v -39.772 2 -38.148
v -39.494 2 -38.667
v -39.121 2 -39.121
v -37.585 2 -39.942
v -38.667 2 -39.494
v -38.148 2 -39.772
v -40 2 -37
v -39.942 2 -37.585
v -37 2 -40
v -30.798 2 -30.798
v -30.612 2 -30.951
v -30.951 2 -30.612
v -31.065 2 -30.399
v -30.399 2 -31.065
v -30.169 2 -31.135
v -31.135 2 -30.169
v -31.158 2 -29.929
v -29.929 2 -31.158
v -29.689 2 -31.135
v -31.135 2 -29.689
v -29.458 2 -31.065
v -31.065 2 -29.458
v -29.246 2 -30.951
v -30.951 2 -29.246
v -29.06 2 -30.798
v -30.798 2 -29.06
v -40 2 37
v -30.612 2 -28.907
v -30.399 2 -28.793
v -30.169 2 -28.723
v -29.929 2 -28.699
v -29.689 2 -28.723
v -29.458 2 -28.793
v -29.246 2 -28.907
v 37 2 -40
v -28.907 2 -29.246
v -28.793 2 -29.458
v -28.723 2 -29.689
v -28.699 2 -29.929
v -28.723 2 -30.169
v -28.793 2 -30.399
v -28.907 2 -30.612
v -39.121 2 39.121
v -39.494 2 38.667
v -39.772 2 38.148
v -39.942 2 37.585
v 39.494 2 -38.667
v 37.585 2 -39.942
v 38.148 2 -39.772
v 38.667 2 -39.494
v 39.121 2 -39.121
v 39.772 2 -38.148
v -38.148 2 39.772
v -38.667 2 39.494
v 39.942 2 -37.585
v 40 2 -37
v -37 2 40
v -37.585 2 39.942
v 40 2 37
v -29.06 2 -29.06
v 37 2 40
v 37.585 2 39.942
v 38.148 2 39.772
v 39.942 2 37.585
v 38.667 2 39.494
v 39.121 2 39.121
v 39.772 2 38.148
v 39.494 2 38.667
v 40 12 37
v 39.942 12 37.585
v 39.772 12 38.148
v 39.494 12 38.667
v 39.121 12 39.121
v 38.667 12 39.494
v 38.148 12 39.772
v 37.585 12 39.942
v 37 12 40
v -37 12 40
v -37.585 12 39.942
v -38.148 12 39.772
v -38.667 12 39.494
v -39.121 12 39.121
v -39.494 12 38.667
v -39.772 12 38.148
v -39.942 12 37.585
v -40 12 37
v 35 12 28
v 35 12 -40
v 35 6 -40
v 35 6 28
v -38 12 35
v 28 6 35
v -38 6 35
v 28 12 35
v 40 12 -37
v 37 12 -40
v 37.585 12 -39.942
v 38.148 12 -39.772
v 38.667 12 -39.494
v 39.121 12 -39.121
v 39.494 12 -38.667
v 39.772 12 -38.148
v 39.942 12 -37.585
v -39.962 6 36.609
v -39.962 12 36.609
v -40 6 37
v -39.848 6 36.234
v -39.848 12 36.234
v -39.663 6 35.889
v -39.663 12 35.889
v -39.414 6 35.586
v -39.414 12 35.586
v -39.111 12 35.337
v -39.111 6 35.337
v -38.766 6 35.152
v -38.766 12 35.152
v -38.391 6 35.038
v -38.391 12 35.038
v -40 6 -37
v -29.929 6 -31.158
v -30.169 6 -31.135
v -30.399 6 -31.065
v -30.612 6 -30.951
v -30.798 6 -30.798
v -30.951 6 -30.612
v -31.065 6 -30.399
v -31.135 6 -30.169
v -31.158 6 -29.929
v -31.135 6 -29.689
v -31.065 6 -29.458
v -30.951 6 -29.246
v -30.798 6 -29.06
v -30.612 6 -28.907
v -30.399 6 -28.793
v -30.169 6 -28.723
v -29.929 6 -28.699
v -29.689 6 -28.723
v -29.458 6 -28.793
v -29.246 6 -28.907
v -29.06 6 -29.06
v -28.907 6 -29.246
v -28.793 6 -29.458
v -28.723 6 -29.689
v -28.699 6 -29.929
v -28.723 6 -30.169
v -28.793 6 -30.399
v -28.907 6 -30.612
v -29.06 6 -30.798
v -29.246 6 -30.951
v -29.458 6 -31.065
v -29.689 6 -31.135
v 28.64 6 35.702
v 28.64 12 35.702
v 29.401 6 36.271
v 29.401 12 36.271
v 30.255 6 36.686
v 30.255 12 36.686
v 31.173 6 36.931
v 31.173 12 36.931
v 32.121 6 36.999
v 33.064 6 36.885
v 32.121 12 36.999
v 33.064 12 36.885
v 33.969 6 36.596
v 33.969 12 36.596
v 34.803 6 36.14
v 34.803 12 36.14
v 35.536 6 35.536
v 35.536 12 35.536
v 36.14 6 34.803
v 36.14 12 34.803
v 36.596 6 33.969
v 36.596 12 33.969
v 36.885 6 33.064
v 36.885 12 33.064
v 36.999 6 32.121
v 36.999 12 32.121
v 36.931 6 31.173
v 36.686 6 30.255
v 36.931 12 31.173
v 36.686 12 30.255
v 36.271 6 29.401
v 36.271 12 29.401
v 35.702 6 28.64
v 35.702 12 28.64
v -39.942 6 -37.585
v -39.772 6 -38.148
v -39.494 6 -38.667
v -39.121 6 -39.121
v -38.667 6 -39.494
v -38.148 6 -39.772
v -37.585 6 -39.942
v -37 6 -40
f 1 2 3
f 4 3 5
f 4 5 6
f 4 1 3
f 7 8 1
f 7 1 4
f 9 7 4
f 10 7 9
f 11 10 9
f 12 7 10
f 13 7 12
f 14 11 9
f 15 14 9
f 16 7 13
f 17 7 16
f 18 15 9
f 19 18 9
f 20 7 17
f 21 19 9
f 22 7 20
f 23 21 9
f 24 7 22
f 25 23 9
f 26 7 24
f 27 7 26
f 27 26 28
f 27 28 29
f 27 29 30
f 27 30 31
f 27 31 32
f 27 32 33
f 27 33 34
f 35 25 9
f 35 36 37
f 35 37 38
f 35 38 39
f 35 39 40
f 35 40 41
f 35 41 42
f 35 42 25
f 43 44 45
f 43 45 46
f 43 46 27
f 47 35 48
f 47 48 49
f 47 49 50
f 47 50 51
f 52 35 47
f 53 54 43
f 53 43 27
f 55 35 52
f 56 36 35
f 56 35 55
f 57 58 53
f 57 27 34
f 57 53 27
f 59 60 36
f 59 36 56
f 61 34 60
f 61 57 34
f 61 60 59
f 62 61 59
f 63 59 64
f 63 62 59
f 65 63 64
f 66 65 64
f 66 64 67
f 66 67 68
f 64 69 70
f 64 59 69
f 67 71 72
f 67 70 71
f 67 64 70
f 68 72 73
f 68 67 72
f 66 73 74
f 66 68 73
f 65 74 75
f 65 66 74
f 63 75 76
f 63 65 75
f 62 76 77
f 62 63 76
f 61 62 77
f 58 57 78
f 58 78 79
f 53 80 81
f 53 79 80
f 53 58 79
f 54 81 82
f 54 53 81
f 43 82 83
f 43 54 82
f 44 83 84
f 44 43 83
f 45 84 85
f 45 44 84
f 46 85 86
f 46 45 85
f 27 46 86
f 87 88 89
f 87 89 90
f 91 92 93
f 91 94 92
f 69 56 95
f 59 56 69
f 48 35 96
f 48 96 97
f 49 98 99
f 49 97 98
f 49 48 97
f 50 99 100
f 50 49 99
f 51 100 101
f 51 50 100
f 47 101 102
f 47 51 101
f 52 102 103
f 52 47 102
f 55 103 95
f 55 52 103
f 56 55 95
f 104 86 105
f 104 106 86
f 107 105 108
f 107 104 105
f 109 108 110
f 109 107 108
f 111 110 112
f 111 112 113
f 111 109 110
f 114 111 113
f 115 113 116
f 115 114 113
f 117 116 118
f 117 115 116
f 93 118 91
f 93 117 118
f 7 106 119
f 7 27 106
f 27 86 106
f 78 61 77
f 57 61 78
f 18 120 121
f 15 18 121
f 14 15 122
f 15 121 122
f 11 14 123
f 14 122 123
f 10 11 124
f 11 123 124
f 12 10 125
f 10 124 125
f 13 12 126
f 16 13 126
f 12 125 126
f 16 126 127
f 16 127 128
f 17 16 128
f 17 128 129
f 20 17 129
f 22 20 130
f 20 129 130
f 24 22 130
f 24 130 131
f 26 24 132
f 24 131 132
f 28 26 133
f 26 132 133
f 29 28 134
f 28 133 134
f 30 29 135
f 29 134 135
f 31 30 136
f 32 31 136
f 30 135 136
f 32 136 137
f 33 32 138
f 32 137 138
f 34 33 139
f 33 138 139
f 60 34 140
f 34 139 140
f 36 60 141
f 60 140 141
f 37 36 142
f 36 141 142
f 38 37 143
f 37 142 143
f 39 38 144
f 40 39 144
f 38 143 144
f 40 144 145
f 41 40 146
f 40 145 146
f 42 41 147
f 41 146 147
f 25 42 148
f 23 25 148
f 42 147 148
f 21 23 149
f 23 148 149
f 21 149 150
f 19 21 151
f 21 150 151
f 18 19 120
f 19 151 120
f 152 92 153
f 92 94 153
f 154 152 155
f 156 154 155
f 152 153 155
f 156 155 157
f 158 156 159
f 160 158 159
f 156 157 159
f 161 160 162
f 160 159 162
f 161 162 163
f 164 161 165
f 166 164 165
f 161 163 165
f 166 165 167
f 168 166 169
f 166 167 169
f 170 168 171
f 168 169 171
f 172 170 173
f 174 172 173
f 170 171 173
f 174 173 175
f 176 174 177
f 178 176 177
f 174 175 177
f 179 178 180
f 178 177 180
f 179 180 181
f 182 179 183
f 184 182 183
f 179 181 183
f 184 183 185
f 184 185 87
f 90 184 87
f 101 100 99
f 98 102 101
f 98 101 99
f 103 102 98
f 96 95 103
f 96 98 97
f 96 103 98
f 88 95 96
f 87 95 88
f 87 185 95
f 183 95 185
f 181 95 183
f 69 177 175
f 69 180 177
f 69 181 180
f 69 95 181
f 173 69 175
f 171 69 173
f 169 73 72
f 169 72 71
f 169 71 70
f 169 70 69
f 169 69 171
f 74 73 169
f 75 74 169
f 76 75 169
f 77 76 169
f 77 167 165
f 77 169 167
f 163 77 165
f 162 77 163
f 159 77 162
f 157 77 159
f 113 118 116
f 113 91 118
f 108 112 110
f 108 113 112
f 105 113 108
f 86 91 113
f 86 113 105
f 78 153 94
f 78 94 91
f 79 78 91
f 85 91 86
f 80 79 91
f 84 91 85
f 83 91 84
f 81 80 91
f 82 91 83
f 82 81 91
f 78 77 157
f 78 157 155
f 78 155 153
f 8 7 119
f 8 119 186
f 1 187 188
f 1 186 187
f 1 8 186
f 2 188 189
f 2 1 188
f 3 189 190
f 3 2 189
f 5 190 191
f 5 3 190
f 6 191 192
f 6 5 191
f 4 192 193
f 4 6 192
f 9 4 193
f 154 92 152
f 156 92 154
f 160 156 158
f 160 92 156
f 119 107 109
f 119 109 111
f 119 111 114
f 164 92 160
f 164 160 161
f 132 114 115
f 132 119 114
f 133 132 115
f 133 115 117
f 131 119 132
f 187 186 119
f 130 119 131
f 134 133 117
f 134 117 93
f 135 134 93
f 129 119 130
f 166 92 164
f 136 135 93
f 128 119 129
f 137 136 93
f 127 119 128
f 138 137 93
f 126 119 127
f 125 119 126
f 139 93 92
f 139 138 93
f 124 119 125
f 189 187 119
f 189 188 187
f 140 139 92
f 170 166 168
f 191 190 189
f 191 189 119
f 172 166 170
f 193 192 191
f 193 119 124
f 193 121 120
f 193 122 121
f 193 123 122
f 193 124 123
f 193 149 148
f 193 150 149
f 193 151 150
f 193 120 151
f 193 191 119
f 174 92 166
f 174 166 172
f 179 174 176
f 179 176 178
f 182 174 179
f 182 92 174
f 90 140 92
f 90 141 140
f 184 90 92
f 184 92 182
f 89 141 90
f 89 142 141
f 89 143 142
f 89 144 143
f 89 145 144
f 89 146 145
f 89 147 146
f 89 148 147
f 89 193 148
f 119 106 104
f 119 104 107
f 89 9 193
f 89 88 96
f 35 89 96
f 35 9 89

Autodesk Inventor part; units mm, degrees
ref_plane "YZ Plane" through (0, 0, 0) normal (1, 0, 0) x (0, 1, 0)
ref_plane "XZ Plane" through (0, 0, 0) normal (0, 1, 0) x (-1, 0, 0)
ref_plane "XY Plane" through (0, 0, 0) normal (0, 0, 1) x (1, 0, 0)
sketch "Skizze1" plane through (0, 0, 0) normal (0, 1, 0) x (-1, 0, 0)
  line L0 (-37, 40) -> (37, 40)
  line L1 (40, 37) -> (40, -37)
  line L2 (37, -40) -> (-37, -40)
  line L3 (-40, -37) -> (-40, 37)
  line L4 (-40, 40) -> (40, -40) construction
  line L5 (40, 40) -> (-40, -40) construction
  arc A0 (40, 37) -> (37, 40) centre (37, 37) ccw
  arc A1 (-37, 40) -> (-40, 37) centre (-37, 37) ccw
  arc A2 (-40, -37) -> (-37, -40) centre (-37, -37) ccw
  arc A3 (37, -40) -> (40, -37) centre (37, -37) ccw
  point P0 (0, 0)
  dimension "d0" = 80
  dimension "d1" = 80
  dimension "d2" = 3
  dimension "d3" = 3
  dimension "d4" = 3
  dimension "d5" = 3
extrude "Extrusion1" add sketch "Skizze1" along normal blind 12
sketch "Skizze2" plane through (0, 12, 0) normal (0, 1, 0) x (1, 0, 0)
  line L0 (-40, 37) -> (-40, -37) projected
  arc A0 (-40, -37) -> (-37, -40) centre (-37, -37) ccw projected
  line L1 (-37, -40) -> (37, -40) projected
  arc A1 (37, -40) -> (40, -37) centre (37, -37) ccw projected
  line L2 (40, -37) -> (40, 37) projected
  arc A2 (40, 37) -> (37, 40) centre (37, 37) ccw projected
  line L3 (37, 40) -> (-37, 40) projected
  arc A3 (-37, 40) -> (-40, 37) centre (-37, 37) ccw projected
  line L4 (-35, -35) -> (-35, 35) construction
  line L5 (-35, 35) -> (35, 35) construction
  line L6 (35, 35) -> (35, -28)
  line L7 (28, -35) -> (-35, -35)
  line L8 (-35, -35) -> (-40, -35)
  line L9 (35, 35) -> (35, 40)
  arc A4 (28, -35) -> (35, -28) centre (32, -32) ccw
  point P0 (0, 0)
  dimension "d8" = 5
  dimension "d21" = 10
extrude "Extrusion2" cut sketch "Skizze2" against normal blind 6 contours A3 L3 L9 L6 A4 L7 L8 L0
fillet "Rundung1" radius 2 1 edges at (-40, 9, 35)
sketch "Skizze3" plane through (0, 0, 0) normal (0, -1, 0) x (1, 0, 0)
  arc A0 (-40, -37) -> (-37, -40) centre (-37, -37) ccw projected
  line L0 (-37, -37) -> (0, 0) construction
  line L1 (-37, -37) -> (-29.9289, -29.9289) construction
  dimension "d13" = 10
hole "Bohrung1" at (-29.9289, 0, -29.9289) direction (0, 1, 0) diameter 2.459 end through all thread size "M3x0.5" class "6H" standard "ISO Metric profile"
sketch "Skizze4" plane through (-37, 0, 40) normal (0, 0, 1) x (1, 0, 0)
  line L0 (-3, 0) -> (0, 0) projected
  line L1 (74, 0) -> (0, 0) projected
  line L2 (74, 0) -> (77, 0) projected
  line L3 (-3, 2) -> (0, 2)
  line L4 (0, 2) -> (74, 2)
  line L5 (74, 2) -> (77, 2)
  line L6 (-3, 0) -> (-3, 6) projected
  line L7 (77, 0) -> (77, 12) projected
  point P0 (37, 0)
  dimension "d22" = 2
extrude "Extrusion3" cut sketch "Skizze4" against normal blind 80
properties part number "Tastplatte" material "Aluminium 6061"
